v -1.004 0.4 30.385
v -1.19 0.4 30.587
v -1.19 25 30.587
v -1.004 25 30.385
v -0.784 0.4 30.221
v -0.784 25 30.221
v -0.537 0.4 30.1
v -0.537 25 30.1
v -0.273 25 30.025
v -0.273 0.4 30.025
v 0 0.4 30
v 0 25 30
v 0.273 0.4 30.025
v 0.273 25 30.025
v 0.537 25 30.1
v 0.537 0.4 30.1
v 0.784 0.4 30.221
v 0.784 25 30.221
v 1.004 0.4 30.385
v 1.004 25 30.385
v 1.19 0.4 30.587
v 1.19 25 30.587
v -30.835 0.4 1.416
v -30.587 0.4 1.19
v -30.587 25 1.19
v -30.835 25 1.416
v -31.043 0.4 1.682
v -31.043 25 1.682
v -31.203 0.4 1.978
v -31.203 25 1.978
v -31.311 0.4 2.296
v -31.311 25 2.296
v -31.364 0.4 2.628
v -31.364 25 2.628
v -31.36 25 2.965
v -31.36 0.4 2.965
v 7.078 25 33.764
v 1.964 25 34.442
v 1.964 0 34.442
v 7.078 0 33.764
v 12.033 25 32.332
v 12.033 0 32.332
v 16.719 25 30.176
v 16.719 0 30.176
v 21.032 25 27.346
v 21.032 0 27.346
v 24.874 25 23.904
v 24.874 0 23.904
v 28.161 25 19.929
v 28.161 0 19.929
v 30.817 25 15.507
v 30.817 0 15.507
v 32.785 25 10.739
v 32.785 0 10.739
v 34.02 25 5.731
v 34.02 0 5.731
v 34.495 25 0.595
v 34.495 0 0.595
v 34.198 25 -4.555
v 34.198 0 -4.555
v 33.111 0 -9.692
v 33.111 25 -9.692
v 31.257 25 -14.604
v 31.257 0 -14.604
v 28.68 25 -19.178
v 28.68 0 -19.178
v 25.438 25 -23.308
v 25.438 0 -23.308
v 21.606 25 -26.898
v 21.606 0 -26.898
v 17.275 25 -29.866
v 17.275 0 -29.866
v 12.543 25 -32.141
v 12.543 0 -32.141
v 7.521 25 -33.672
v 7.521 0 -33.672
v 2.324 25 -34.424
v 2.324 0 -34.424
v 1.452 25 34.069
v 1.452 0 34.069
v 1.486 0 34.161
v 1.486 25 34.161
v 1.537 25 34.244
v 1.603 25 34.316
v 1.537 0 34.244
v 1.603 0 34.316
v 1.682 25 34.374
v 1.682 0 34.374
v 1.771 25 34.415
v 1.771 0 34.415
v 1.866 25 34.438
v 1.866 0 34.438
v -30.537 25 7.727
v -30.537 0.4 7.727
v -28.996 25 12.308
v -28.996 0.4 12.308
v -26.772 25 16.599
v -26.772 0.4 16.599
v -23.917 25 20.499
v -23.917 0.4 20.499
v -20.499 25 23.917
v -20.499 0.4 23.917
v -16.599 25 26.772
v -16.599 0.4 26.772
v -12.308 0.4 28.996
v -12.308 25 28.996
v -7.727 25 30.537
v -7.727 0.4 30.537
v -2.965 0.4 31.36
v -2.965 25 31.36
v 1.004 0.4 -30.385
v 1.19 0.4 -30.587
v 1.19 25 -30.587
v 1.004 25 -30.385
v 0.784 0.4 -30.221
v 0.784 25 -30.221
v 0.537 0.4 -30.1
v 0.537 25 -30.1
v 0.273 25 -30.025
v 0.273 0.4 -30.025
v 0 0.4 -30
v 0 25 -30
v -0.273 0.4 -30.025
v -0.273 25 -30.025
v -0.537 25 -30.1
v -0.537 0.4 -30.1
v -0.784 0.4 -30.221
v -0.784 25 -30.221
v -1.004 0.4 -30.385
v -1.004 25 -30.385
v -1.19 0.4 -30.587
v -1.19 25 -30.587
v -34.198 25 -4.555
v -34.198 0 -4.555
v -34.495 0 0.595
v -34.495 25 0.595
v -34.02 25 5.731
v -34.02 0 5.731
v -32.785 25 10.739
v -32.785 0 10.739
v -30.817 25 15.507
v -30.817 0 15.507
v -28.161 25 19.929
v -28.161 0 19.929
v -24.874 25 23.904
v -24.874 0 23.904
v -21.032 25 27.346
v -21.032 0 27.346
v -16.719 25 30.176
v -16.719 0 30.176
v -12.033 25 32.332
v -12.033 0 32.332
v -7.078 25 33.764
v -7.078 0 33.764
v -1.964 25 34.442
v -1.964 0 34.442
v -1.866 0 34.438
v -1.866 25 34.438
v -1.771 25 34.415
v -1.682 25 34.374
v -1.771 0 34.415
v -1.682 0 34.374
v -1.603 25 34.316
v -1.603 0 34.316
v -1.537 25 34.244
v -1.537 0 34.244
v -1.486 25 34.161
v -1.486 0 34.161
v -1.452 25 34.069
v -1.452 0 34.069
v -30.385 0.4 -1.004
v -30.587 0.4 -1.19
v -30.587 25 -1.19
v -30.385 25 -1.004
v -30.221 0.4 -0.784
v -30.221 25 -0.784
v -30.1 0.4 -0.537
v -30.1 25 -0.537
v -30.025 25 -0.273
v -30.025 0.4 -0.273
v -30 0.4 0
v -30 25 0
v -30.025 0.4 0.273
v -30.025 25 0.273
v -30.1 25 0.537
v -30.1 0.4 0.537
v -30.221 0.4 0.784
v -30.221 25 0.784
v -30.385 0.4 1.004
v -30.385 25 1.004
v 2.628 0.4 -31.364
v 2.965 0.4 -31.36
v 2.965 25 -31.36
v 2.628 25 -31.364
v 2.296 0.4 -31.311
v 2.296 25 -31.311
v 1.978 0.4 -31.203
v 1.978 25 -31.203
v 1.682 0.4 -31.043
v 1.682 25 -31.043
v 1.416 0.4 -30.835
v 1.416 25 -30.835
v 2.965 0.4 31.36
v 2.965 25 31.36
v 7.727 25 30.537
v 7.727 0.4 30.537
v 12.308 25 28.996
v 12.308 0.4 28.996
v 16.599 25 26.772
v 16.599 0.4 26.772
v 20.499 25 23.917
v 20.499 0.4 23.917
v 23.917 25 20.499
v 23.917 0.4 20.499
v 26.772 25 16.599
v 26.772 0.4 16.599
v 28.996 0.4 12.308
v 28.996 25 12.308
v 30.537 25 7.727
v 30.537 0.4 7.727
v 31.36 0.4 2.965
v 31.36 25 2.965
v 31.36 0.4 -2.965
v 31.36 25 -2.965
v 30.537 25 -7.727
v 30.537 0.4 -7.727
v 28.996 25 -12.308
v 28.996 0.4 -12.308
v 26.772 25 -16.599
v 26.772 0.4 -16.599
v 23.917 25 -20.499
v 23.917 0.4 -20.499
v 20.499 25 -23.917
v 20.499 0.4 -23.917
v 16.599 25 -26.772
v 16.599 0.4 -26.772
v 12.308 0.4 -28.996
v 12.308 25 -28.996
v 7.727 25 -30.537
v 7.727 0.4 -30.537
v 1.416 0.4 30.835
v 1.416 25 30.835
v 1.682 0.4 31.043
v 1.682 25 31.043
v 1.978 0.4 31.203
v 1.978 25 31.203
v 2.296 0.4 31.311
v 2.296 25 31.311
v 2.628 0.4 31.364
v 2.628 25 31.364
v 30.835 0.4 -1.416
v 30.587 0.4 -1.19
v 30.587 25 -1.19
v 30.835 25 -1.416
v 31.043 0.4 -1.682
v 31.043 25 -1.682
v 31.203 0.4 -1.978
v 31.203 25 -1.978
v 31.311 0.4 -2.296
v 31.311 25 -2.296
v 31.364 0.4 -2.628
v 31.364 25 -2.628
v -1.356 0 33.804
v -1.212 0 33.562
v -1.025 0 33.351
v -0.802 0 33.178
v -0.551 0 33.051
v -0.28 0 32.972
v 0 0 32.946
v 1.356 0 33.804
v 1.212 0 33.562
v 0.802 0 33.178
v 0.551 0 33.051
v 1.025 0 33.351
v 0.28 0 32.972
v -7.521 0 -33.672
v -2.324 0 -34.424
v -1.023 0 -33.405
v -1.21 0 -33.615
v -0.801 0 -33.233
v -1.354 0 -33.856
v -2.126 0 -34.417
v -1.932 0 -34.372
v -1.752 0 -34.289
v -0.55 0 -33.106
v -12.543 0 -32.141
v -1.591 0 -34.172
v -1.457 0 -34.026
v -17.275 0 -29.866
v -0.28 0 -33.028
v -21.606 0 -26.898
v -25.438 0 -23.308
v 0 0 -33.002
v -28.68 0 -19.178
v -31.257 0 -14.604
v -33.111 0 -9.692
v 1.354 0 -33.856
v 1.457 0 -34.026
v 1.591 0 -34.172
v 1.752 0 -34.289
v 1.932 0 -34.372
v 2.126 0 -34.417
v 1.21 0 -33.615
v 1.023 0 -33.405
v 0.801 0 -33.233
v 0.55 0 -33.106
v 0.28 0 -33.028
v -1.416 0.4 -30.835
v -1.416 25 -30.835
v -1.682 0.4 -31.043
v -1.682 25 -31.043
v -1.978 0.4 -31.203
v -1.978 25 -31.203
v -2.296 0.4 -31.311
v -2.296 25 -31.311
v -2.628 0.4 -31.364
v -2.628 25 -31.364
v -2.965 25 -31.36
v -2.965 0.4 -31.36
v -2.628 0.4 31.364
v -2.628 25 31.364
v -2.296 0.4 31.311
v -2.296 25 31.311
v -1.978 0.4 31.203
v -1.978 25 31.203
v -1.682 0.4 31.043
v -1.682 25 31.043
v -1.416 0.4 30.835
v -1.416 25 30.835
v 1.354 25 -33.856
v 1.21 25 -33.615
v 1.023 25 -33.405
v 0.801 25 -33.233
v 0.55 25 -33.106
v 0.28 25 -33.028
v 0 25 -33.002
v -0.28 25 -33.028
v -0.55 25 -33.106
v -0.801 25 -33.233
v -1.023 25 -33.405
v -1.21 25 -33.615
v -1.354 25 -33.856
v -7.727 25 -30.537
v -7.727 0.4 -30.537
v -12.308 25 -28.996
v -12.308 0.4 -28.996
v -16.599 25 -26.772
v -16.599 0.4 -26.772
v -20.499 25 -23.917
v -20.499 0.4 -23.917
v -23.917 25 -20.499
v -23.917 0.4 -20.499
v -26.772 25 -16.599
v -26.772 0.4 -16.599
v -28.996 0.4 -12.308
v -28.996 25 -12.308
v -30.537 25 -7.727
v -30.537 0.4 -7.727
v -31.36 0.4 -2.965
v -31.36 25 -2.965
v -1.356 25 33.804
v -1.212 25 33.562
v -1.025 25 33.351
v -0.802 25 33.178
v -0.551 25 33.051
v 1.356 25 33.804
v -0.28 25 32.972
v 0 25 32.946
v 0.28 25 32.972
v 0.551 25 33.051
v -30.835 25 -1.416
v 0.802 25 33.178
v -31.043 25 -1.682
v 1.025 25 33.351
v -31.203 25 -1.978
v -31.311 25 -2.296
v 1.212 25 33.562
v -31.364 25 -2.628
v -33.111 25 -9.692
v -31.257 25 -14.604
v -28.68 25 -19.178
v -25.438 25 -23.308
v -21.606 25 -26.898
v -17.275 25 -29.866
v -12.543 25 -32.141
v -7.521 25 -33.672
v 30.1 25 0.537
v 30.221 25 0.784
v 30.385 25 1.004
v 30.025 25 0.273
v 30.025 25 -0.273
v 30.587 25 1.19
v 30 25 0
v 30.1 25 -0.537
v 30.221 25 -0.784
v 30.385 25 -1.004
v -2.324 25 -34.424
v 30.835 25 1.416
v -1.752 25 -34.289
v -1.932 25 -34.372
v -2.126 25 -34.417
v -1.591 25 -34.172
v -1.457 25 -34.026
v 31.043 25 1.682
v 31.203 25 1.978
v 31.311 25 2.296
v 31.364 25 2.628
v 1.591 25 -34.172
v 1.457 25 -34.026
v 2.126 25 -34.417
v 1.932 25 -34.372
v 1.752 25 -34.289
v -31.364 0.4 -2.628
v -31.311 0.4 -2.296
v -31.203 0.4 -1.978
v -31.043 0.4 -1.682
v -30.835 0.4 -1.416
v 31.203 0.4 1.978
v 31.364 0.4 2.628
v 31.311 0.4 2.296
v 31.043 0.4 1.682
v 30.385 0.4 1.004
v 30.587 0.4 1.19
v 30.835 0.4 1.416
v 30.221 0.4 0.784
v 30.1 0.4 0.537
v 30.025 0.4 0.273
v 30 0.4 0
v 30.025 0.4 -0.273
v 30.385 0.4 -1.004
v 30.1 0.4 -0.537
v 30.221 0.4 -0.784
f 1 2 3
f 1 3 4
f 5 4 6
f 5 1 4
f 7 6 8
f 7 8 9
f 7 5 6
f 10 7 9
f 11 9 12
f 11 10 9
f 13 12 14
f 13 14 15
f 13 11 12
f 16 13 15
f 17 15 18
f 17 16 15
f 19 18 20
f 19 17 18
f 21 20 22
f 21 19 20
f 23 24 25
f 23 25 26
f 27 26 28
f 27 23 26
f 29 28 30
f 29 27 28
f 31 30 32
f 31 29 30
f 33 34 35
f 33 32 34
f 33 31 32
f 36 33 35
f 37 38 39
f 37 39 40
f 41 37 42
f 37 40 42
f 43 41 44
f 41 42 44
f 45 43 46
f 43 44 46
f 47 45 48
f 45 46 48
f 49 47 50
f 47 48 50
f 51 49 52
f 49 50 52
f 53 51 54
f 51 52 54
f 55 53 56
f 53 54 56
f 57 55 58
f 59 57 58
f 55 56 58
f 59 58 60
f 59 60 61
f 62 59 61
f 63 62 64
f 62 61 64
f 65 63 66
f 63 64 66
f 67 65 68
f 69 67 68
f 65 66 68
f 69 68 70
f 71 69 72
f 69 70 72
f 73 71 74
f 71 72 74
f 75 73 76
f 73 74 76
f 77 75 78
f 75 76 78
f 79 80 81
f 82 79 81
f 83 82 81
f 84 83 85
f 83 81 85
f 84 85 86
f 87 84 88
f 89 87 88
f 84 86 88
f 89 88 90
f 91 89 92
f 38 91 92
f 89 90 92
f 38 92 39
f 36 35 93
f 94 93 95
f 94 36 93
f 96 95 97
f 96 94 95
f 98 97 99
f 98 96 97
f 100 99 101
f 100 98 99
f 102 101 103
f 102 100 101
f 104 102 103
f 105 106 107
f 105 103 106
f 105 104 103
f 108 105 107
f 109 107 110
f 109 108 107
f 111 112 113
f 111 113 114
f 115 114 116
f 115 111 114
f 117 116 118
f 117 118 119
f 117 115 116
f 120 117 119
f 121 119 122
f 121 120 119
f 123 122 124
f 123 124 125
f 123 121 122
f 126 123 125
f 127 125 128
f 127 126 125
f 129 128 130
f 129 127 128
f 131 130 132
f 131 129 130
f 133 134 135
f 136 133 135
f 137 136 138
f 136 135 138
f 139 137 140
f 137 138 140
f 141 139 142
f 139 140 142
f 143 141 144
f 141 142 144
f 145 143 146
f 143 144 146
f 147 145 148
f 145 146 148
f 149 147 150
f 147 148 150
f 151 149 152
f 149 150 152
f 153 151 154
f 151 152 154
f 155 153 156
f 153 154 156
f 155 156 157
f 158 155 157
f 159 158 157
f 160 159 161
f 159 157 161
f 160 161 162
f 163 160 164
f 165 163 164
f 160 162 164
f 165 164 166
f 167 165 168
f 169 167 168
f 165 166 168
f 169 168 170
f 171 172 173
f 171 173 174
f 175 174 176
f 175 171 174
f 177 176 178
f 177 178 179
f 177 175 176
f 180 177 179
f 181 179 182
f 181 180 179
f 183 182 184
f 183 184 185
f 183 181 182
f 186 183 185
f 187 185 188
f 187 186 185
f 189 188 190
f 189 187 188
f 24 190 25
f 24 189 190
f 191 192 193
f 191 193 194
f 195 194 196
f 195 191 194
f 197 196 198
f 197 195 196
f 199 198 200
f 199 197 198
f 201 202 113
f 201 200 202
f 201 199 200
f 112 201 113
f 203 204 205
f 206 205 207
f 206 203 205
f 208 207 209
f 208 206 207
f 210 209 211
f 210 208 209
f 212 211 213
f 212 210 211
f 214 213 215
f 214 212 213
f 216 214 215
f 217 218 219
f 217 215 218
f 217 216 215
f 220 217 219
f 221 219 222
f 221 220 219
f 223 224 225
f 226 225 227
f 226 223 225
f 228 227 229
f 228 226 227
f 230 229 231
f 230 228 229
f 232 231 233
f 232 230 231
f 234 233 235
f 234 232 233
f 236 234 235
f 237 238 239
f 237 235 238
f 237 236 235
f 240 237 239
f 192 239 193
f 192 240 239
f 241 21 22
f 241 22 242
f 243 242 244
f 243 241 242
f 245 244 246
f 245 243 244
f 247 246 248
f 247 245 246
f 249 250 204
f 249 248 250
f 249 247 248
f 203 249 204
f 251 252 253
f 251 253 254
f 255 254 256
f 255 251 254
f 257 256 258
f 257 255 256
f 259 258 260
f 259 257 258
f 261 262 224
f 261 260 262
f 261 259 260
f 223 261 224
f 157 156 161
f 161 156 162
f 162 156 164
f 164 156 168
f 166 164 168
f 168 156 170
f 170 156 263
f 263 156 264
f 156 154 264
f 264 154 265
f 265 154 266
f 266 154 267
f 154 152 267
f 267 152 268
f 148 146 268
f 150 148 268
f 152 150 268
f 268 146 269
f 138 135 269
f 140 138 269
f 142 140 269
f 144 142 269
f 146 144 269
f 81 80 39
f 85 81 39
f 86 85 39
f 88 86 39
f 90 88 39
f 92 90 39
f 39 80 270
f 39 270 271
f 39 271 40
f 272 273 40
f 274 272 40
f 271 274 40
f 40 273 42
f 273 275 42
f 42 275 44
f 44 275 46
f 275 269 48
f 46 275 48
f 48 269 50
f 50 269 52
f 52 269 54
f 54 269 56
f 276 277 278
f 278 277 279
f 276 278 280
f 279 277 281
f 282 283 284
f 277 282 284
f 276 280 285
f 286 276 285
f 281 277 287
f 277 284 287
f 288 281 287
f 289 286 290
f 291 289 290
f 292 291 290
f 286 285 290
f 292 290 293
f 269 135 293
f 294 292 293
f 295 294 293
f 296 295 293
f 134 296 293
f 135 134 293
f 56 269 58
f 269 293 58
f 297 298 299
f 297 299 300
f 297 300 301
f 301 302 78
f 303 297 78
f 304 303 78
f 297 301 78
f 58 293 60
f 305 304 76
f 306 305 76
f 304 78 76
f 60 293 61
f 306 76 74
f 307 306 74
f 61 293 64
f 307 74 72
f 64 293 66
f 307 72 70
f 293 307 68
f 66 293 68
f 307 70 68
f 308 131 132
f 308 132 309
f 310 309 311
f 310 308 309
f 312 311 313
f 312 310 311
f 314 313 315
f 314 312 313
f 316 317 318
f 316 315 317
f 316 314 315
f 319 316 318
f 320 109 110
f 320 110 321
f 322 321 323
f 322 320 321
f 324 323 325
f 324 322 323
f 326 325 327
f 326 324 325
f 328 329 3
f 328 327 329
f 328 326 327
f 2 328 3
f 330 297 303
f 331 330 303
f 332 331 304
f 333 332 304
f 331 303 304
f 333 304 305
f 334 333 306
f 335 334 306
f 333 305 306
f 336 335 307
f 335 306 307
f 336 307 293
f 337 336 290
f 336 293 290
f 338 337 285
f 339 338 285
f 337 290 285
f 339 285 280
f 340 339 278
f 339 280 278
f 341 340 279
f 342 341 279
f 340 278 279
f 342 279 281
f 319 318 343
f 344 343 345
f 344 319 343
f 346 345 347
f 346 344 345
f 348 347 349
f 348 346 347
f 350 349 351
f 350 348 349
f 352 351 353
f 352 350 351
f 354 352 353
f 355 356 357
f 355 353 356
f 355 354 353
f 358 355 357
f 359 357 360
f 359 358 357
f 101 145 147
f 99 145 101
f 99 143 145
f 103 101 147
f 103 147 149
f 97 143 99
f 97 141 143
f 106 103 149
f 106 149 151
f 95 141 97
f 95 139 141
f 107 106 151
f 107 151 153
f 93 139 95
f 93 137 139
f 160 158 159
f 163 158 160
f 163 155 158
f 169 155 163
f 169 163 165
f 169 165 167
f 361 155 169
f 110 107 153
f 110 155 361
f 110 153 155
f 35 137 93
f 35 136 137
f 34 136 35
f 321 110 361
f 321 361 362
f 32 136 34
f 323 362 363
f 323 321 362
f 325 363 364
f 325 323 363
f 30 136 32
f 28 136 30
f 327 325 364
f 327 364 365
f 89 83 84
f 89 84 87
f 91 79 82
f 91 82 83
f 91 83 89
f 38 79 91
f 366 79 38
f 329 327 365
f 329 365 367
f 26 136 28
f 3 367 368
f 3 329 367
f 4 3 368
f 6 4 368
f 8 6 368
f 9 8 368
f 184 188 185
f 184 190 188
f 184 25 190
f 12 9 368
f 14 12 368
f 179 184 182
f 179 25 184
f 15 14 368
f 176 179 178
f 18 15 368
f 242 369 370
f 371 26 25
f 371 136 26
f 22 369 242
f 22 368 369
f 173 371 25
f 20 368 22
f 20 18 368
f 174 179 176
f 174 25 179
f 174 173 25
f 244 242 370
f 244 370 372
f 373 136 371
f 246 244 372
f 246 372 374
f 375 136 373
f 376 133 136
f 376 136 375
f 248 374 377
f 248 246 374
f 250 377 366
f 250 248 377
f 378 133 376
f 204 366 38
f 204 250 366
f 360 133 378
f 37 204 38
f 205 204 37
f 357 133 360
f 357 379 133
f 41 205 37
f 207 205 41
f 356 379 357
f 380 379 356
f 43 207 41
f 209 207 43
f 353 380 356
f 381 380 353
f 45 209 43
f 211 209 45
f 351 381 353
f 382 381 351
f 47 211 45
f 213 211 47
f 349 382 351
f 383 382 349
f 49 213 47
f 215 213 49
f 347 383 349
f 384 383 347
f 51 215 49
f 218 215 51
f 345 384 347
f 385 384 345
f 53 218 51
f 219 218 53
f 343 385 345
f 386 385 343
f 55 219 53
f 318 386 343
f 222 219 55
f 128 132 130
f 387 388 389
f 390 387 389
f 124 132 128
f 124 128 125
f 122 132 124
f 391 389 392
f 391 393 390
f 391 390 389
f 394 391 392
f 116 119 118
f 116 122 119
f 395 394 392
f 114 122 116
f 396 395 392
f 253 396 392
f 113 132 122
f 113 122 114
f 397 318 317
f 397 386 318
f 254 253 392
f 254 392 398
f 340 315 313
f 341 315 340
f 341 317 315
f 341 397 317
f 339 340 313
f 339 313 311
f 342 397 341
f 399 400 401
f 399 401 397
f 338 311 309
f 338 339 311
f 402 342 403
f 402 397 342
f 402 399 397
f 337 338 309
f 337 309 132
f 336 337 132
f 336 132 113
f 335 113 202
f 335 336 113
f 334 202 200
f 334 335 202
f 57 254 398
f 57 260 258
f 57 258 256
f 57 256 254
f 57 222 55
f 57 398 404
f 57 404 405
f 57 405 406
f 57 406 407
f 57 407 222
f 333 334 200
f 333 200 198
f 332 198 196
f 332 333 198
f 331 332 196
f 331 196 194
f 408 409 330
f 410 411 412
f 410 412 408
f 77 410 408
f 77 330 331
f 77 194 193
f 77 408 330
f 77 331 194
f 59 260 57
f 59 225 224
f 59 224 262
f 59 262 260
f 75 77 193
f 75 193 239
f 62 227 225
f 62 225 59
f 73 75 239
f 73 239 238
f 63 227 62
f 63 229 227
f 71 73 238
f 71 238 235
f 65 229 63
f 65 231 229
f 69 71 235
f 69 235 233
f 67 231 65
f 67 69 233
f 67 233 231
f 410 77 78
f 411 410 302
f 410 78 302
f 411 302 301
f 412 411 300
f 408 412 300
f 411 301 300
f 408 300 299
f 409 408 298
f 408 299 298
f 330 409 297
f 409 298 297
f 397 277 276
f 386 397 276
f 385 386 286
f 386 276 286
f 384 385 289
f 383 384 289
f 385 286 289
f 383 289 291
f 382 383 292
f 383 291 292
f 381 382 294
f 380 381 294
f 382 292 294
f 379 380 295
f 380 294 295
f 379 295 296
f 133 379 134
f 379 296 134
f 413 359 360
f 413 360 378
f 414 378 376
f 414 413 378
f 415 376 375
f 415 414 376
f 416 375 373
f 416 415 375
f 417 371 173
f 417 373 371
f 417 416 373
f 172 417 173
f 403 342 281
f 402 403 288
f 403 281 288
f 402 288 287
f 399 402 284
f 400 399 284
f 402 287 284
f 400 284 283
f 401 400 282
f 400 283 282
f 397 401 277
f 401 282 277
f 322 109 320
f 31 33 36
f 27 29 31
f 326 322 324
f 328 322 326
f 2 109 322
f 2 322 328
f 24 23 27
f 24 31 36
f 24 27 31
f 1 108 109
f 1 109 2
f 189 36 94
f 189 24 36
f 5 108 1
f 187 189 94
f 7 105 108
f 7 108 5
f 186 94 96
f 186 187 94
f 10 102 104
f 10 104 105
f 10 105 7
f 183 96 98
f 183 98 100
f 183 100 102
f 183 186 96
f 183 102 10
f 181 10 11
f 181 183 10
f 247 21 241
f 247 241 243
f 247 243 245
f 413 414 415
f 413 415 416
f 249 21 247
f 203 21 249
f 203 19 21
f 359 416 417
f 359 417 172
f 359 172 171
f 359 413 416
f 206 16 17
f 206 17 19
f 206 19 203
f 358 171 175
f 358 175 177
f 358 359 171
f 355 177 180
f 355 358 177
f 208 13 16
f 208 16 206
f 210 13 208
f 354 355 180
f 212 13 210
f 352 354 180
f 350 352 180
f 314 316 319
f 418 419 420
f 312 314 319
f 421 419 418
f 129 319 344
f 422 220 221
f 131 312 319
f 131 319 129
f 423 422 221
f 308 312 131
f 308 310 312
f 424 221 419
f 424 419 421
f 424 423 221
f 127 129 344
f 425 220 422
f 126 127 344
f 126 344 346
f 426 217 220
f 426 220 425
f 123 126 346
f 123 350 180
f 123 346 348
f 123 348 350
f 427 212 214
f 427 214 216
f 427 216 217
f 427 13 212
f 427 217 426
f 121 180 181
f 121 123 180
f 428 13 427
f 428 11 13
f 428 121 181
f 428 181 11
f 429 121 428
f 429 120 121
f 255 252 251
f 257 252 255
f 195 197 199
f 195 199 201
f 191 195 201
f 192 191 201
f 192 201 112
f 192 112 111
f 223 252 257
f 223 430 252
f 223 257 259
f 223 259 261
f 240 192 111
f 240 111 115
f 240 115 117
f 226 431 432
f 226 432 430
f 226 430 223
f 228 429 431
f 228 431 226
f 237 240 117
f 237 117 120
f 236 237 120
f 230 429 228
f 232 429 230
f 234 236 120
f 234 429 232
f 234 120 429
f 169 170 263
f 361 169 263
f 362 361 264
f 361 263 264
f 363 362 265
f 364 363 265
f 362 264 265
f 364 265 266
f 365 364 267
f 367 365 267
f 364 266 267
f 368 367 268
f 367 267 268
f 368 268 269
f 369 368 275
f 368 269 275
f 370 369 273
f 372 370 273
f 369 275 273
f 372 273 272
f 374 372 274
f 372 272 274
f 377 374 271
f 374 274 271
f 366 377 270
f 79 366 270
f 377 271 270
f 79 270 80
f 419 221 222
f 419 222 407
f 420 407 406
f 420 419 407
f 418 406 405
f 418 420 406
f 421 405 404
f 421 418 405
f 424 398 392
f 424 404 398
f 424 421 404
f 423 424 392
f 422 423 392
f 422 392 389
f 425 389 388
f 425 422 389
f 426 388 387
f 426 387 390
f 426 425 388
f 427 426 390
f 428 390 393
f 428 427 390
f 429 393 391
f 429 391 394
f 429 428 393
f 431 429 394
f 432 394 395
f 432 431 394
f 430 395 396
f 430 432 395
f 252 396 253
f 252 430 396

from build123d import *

# Parameters (mm, degrees)
BOSS_EXTRUDE1_DEPTH = 25
CUT_EXTRUDE2_DEPTH  = 26
BOSS_EXTRUDE2_DEPTH = 0.4


with BuildPart() as part:
    # Sketch1 → Boss-Extrude1 (new body)
    with BuildSketch(Plane(origin=(0, 0, 0), x_dir=(1, 0, 0), z_dir=(0, 1, 0))):
        with BuildLine():
            ThreePointArc((1.451818925, -34.068556857), (1.641248992, -34.346908706), (1.964225605, -34.442038138))
            ThreePointArc((1.964225605, -34.442038138), (26.591847487, -21.978073076), (34.198225299, 4.555174015))
            ThreePointArc((34.198225299, 4.555174015), (23.590291339, 25.176355888), (2.324135821, 34.423627607))
            ThreePointArc((2.324135821, 34.423627607), (1.751838249, 34.289058819), (1.354061739, 33.856153382))
            ThreePointArc((1.354061739, 33.856153382), (0, 33.001534515), (-1.354061739, 33.856153382))
            ThreePointArc((-1.354061739, 33.856153382), (-1.751838249, 34.289058819), (-2.324135821, 34.423627607))
            ThreePointArc((-2.324135821, 34.423627607), (-23.590291339, 25.176355888), (-34.198225299, 4.555174015))
            ThreePointArc((-34.198225299, 4.555174015), (-26.591847487, -21.978073076), (-1.964225605, -34.442038138))
            ThreePointArc((-1.964225605, -34.442038138), (-1.641248992, -34.346908706), (-1.451818925, -34.068556857))
            ThreePointArc((-1.451818925, -34.068556857), (0, -32.945679925), (1.451818925, -34.068556857))
        make_face()
        with BuildLine():
            Line((-2.417, 3.787737139), (0, 3.787737139))
            Line((0, 3.787737139), (2.417, 3.787737139))
            ThreePointArc((2.417, 3.787737139), (0, -4.489512172), (-2.417, 3.787737139))
        make_face(mode=Mode.SUBTRACT)
    extrude(amount=BOSS_EXTRUDE1_DEPTH)

    # Sketch2 → Cut-Extrude2 (cut, through all)
    with BuildSketch(Plane(origin=(0, 0, 0), x_dir=(1, 0, 0), z_dir=(0, 1, 0))):
        with BuildLine():
            ThreePointArc((-31.360169492, -2.964754537), (-22.273863607, -22.273863607), (-2.964754537, -31.360169492))
            ThreePointArc((-2.964754537, -31.360169492), (-1.977522645, -31.202516837), (-1.189935494, -30.586734694))
            ThreePointArc((-1.189935494, -30.586734694), (0, -30), (1.189935494, -30.586734694))
            ThreePointArc((1.189935494, -30.586734694), (1.977522645, -31.202516837), (2.964754537, -31.360169492))
            ThreePointArc((2.964754537, -31.360169492), (22.273863607, -22.273863607), (31.360169492, -2.964754537))
            ThreePointArc((31.360169492, -2.964754537), (31.202516837, -1.977522645), (30.586734694, -1.189935494))
            ThreePointArc((30.586734694, -1.189935494), (30, 0), (30.586734694, 1.189935494))
            ThreePointArc((30.586734694, 1.189935494), (31.202516837, 1.977522645), (31.360169492, 2.964754537))
            ThreePointArc((31.360169492, 2.964754537), (22.273863607, 22.273863607), (2.964754537, 31.360169492))
            ThreePointArc((2.964754537, 31.360169492), (1.977522645, 31.202516837), (1.189935494, 30.586734694))
            ThreePointArc((1.189935494, 30.586734694), (0, 30), (-1.189935494, 30.586734694))
            ThreePointArc((-1.189935494, 30.586734694), (-1.977522645, 31.202516837), (-2.964754537, 31.360169492))
            ThreePointArc((-2.964754537, 31.360169492), (-22.273863607, 22.273863607), (-31.360169492, 2.964754537))
            ThreePointArc((-31.360169492, 2.964754537), (-31.202516837, 1.977522645), (-30.586734694, 1.189935494))
            ThreePointArc((-30.586734694, 1.189935494), (-30, 0), (-30.586734694, -1.189935494))
            ThreePointArc((-30.586734694, -1.189935494), (-31.202516837, -1.977522645), (-31.360169492, -2.964754537))
        make_face()
    extrude(amount=CUT_EXTRUDE2_DEPTH, mode=Mode.SUBTRACT)

    # Sketch2<2> → Boss-Extrude2 (add)
    with BuildSketch(Plane(origin=(0, 0, 0), x_dir=(1, 0, 0), z_dir=(0, 1, 0))):
        with BuildLine():
            ThreePointArc((-31.360169492, -2.964754537), (-22.273863607, -22.273863607), (-2.964754537, -31.360169492))
            ThreePointArc((-2.964754537, -31.360169492), (-1.977522645, -31.202516837), (-1.189935494, -30.586734694))
            ThreePointArc((-1.189935494, -30.586734694), (0, -30), (1.189935494, -30.586734694))
            ThreePointArc((1.189935494, -30.586734694), (1.977522645, -31.202516837), (2.964754537, -31.360169492))
            ThreePointArc((2.964754537, -31.360169492), (22.273863607, -22.273863607), (31.360169492, -2.964754537))
            ThreePointArc((31.360169492, -2.964754537), (31.202516837, -1.977522645), (30.586734694, -1.189935494))
            ThreePointArc((30.586734694, -1.189935494), (30, 0), (30.586734694, 1.189935494))
            ThreePointArc((30.586734694, 1.189935494), (31.202516837, 1.977522645), (31.360169492, 2.964754537))
            ThreePointArc((31.360169492, 2.964754537), (22.273863607, 22.273863607), (2.964754537, 31.360169492))
            ThreePointArc((2.964754537, 31.360169492), (1.977522645, 31.202516837), (1.189935494, 30.586734694))
            ThreePointArc((1.189935494, 30.586734694), (0, 30), (-1.189935494, 30.586734694))
            ThreePointArc((-1.189935494, 30.586734694), (-1.977522645, 31.202516837), (-2.964754537, 31.360169492))
            ThreePointArc((-2.964754537, 31.360169492), (-22.273863607, 22.273863607), (-31.360169492, 2.964754537))
            ThreePointArc((-31.360169492, 2.964754537), (-31.202516837, 1.977522645), (-30.586734694, 1.189935494))
            ThreePointArc((-30.586734694, 1.189935494), (-30, 0), (-30.586734694, -1.189935494))
            ThreePointArc((-30.586734694, -1.189935494), (-31.202516837, -1.977522645), (-31.360169492, -2.964754537))
        make_face()
    extrude(amount=BOSS_EXTRUDE2_DEPTH)


solid = part.part
